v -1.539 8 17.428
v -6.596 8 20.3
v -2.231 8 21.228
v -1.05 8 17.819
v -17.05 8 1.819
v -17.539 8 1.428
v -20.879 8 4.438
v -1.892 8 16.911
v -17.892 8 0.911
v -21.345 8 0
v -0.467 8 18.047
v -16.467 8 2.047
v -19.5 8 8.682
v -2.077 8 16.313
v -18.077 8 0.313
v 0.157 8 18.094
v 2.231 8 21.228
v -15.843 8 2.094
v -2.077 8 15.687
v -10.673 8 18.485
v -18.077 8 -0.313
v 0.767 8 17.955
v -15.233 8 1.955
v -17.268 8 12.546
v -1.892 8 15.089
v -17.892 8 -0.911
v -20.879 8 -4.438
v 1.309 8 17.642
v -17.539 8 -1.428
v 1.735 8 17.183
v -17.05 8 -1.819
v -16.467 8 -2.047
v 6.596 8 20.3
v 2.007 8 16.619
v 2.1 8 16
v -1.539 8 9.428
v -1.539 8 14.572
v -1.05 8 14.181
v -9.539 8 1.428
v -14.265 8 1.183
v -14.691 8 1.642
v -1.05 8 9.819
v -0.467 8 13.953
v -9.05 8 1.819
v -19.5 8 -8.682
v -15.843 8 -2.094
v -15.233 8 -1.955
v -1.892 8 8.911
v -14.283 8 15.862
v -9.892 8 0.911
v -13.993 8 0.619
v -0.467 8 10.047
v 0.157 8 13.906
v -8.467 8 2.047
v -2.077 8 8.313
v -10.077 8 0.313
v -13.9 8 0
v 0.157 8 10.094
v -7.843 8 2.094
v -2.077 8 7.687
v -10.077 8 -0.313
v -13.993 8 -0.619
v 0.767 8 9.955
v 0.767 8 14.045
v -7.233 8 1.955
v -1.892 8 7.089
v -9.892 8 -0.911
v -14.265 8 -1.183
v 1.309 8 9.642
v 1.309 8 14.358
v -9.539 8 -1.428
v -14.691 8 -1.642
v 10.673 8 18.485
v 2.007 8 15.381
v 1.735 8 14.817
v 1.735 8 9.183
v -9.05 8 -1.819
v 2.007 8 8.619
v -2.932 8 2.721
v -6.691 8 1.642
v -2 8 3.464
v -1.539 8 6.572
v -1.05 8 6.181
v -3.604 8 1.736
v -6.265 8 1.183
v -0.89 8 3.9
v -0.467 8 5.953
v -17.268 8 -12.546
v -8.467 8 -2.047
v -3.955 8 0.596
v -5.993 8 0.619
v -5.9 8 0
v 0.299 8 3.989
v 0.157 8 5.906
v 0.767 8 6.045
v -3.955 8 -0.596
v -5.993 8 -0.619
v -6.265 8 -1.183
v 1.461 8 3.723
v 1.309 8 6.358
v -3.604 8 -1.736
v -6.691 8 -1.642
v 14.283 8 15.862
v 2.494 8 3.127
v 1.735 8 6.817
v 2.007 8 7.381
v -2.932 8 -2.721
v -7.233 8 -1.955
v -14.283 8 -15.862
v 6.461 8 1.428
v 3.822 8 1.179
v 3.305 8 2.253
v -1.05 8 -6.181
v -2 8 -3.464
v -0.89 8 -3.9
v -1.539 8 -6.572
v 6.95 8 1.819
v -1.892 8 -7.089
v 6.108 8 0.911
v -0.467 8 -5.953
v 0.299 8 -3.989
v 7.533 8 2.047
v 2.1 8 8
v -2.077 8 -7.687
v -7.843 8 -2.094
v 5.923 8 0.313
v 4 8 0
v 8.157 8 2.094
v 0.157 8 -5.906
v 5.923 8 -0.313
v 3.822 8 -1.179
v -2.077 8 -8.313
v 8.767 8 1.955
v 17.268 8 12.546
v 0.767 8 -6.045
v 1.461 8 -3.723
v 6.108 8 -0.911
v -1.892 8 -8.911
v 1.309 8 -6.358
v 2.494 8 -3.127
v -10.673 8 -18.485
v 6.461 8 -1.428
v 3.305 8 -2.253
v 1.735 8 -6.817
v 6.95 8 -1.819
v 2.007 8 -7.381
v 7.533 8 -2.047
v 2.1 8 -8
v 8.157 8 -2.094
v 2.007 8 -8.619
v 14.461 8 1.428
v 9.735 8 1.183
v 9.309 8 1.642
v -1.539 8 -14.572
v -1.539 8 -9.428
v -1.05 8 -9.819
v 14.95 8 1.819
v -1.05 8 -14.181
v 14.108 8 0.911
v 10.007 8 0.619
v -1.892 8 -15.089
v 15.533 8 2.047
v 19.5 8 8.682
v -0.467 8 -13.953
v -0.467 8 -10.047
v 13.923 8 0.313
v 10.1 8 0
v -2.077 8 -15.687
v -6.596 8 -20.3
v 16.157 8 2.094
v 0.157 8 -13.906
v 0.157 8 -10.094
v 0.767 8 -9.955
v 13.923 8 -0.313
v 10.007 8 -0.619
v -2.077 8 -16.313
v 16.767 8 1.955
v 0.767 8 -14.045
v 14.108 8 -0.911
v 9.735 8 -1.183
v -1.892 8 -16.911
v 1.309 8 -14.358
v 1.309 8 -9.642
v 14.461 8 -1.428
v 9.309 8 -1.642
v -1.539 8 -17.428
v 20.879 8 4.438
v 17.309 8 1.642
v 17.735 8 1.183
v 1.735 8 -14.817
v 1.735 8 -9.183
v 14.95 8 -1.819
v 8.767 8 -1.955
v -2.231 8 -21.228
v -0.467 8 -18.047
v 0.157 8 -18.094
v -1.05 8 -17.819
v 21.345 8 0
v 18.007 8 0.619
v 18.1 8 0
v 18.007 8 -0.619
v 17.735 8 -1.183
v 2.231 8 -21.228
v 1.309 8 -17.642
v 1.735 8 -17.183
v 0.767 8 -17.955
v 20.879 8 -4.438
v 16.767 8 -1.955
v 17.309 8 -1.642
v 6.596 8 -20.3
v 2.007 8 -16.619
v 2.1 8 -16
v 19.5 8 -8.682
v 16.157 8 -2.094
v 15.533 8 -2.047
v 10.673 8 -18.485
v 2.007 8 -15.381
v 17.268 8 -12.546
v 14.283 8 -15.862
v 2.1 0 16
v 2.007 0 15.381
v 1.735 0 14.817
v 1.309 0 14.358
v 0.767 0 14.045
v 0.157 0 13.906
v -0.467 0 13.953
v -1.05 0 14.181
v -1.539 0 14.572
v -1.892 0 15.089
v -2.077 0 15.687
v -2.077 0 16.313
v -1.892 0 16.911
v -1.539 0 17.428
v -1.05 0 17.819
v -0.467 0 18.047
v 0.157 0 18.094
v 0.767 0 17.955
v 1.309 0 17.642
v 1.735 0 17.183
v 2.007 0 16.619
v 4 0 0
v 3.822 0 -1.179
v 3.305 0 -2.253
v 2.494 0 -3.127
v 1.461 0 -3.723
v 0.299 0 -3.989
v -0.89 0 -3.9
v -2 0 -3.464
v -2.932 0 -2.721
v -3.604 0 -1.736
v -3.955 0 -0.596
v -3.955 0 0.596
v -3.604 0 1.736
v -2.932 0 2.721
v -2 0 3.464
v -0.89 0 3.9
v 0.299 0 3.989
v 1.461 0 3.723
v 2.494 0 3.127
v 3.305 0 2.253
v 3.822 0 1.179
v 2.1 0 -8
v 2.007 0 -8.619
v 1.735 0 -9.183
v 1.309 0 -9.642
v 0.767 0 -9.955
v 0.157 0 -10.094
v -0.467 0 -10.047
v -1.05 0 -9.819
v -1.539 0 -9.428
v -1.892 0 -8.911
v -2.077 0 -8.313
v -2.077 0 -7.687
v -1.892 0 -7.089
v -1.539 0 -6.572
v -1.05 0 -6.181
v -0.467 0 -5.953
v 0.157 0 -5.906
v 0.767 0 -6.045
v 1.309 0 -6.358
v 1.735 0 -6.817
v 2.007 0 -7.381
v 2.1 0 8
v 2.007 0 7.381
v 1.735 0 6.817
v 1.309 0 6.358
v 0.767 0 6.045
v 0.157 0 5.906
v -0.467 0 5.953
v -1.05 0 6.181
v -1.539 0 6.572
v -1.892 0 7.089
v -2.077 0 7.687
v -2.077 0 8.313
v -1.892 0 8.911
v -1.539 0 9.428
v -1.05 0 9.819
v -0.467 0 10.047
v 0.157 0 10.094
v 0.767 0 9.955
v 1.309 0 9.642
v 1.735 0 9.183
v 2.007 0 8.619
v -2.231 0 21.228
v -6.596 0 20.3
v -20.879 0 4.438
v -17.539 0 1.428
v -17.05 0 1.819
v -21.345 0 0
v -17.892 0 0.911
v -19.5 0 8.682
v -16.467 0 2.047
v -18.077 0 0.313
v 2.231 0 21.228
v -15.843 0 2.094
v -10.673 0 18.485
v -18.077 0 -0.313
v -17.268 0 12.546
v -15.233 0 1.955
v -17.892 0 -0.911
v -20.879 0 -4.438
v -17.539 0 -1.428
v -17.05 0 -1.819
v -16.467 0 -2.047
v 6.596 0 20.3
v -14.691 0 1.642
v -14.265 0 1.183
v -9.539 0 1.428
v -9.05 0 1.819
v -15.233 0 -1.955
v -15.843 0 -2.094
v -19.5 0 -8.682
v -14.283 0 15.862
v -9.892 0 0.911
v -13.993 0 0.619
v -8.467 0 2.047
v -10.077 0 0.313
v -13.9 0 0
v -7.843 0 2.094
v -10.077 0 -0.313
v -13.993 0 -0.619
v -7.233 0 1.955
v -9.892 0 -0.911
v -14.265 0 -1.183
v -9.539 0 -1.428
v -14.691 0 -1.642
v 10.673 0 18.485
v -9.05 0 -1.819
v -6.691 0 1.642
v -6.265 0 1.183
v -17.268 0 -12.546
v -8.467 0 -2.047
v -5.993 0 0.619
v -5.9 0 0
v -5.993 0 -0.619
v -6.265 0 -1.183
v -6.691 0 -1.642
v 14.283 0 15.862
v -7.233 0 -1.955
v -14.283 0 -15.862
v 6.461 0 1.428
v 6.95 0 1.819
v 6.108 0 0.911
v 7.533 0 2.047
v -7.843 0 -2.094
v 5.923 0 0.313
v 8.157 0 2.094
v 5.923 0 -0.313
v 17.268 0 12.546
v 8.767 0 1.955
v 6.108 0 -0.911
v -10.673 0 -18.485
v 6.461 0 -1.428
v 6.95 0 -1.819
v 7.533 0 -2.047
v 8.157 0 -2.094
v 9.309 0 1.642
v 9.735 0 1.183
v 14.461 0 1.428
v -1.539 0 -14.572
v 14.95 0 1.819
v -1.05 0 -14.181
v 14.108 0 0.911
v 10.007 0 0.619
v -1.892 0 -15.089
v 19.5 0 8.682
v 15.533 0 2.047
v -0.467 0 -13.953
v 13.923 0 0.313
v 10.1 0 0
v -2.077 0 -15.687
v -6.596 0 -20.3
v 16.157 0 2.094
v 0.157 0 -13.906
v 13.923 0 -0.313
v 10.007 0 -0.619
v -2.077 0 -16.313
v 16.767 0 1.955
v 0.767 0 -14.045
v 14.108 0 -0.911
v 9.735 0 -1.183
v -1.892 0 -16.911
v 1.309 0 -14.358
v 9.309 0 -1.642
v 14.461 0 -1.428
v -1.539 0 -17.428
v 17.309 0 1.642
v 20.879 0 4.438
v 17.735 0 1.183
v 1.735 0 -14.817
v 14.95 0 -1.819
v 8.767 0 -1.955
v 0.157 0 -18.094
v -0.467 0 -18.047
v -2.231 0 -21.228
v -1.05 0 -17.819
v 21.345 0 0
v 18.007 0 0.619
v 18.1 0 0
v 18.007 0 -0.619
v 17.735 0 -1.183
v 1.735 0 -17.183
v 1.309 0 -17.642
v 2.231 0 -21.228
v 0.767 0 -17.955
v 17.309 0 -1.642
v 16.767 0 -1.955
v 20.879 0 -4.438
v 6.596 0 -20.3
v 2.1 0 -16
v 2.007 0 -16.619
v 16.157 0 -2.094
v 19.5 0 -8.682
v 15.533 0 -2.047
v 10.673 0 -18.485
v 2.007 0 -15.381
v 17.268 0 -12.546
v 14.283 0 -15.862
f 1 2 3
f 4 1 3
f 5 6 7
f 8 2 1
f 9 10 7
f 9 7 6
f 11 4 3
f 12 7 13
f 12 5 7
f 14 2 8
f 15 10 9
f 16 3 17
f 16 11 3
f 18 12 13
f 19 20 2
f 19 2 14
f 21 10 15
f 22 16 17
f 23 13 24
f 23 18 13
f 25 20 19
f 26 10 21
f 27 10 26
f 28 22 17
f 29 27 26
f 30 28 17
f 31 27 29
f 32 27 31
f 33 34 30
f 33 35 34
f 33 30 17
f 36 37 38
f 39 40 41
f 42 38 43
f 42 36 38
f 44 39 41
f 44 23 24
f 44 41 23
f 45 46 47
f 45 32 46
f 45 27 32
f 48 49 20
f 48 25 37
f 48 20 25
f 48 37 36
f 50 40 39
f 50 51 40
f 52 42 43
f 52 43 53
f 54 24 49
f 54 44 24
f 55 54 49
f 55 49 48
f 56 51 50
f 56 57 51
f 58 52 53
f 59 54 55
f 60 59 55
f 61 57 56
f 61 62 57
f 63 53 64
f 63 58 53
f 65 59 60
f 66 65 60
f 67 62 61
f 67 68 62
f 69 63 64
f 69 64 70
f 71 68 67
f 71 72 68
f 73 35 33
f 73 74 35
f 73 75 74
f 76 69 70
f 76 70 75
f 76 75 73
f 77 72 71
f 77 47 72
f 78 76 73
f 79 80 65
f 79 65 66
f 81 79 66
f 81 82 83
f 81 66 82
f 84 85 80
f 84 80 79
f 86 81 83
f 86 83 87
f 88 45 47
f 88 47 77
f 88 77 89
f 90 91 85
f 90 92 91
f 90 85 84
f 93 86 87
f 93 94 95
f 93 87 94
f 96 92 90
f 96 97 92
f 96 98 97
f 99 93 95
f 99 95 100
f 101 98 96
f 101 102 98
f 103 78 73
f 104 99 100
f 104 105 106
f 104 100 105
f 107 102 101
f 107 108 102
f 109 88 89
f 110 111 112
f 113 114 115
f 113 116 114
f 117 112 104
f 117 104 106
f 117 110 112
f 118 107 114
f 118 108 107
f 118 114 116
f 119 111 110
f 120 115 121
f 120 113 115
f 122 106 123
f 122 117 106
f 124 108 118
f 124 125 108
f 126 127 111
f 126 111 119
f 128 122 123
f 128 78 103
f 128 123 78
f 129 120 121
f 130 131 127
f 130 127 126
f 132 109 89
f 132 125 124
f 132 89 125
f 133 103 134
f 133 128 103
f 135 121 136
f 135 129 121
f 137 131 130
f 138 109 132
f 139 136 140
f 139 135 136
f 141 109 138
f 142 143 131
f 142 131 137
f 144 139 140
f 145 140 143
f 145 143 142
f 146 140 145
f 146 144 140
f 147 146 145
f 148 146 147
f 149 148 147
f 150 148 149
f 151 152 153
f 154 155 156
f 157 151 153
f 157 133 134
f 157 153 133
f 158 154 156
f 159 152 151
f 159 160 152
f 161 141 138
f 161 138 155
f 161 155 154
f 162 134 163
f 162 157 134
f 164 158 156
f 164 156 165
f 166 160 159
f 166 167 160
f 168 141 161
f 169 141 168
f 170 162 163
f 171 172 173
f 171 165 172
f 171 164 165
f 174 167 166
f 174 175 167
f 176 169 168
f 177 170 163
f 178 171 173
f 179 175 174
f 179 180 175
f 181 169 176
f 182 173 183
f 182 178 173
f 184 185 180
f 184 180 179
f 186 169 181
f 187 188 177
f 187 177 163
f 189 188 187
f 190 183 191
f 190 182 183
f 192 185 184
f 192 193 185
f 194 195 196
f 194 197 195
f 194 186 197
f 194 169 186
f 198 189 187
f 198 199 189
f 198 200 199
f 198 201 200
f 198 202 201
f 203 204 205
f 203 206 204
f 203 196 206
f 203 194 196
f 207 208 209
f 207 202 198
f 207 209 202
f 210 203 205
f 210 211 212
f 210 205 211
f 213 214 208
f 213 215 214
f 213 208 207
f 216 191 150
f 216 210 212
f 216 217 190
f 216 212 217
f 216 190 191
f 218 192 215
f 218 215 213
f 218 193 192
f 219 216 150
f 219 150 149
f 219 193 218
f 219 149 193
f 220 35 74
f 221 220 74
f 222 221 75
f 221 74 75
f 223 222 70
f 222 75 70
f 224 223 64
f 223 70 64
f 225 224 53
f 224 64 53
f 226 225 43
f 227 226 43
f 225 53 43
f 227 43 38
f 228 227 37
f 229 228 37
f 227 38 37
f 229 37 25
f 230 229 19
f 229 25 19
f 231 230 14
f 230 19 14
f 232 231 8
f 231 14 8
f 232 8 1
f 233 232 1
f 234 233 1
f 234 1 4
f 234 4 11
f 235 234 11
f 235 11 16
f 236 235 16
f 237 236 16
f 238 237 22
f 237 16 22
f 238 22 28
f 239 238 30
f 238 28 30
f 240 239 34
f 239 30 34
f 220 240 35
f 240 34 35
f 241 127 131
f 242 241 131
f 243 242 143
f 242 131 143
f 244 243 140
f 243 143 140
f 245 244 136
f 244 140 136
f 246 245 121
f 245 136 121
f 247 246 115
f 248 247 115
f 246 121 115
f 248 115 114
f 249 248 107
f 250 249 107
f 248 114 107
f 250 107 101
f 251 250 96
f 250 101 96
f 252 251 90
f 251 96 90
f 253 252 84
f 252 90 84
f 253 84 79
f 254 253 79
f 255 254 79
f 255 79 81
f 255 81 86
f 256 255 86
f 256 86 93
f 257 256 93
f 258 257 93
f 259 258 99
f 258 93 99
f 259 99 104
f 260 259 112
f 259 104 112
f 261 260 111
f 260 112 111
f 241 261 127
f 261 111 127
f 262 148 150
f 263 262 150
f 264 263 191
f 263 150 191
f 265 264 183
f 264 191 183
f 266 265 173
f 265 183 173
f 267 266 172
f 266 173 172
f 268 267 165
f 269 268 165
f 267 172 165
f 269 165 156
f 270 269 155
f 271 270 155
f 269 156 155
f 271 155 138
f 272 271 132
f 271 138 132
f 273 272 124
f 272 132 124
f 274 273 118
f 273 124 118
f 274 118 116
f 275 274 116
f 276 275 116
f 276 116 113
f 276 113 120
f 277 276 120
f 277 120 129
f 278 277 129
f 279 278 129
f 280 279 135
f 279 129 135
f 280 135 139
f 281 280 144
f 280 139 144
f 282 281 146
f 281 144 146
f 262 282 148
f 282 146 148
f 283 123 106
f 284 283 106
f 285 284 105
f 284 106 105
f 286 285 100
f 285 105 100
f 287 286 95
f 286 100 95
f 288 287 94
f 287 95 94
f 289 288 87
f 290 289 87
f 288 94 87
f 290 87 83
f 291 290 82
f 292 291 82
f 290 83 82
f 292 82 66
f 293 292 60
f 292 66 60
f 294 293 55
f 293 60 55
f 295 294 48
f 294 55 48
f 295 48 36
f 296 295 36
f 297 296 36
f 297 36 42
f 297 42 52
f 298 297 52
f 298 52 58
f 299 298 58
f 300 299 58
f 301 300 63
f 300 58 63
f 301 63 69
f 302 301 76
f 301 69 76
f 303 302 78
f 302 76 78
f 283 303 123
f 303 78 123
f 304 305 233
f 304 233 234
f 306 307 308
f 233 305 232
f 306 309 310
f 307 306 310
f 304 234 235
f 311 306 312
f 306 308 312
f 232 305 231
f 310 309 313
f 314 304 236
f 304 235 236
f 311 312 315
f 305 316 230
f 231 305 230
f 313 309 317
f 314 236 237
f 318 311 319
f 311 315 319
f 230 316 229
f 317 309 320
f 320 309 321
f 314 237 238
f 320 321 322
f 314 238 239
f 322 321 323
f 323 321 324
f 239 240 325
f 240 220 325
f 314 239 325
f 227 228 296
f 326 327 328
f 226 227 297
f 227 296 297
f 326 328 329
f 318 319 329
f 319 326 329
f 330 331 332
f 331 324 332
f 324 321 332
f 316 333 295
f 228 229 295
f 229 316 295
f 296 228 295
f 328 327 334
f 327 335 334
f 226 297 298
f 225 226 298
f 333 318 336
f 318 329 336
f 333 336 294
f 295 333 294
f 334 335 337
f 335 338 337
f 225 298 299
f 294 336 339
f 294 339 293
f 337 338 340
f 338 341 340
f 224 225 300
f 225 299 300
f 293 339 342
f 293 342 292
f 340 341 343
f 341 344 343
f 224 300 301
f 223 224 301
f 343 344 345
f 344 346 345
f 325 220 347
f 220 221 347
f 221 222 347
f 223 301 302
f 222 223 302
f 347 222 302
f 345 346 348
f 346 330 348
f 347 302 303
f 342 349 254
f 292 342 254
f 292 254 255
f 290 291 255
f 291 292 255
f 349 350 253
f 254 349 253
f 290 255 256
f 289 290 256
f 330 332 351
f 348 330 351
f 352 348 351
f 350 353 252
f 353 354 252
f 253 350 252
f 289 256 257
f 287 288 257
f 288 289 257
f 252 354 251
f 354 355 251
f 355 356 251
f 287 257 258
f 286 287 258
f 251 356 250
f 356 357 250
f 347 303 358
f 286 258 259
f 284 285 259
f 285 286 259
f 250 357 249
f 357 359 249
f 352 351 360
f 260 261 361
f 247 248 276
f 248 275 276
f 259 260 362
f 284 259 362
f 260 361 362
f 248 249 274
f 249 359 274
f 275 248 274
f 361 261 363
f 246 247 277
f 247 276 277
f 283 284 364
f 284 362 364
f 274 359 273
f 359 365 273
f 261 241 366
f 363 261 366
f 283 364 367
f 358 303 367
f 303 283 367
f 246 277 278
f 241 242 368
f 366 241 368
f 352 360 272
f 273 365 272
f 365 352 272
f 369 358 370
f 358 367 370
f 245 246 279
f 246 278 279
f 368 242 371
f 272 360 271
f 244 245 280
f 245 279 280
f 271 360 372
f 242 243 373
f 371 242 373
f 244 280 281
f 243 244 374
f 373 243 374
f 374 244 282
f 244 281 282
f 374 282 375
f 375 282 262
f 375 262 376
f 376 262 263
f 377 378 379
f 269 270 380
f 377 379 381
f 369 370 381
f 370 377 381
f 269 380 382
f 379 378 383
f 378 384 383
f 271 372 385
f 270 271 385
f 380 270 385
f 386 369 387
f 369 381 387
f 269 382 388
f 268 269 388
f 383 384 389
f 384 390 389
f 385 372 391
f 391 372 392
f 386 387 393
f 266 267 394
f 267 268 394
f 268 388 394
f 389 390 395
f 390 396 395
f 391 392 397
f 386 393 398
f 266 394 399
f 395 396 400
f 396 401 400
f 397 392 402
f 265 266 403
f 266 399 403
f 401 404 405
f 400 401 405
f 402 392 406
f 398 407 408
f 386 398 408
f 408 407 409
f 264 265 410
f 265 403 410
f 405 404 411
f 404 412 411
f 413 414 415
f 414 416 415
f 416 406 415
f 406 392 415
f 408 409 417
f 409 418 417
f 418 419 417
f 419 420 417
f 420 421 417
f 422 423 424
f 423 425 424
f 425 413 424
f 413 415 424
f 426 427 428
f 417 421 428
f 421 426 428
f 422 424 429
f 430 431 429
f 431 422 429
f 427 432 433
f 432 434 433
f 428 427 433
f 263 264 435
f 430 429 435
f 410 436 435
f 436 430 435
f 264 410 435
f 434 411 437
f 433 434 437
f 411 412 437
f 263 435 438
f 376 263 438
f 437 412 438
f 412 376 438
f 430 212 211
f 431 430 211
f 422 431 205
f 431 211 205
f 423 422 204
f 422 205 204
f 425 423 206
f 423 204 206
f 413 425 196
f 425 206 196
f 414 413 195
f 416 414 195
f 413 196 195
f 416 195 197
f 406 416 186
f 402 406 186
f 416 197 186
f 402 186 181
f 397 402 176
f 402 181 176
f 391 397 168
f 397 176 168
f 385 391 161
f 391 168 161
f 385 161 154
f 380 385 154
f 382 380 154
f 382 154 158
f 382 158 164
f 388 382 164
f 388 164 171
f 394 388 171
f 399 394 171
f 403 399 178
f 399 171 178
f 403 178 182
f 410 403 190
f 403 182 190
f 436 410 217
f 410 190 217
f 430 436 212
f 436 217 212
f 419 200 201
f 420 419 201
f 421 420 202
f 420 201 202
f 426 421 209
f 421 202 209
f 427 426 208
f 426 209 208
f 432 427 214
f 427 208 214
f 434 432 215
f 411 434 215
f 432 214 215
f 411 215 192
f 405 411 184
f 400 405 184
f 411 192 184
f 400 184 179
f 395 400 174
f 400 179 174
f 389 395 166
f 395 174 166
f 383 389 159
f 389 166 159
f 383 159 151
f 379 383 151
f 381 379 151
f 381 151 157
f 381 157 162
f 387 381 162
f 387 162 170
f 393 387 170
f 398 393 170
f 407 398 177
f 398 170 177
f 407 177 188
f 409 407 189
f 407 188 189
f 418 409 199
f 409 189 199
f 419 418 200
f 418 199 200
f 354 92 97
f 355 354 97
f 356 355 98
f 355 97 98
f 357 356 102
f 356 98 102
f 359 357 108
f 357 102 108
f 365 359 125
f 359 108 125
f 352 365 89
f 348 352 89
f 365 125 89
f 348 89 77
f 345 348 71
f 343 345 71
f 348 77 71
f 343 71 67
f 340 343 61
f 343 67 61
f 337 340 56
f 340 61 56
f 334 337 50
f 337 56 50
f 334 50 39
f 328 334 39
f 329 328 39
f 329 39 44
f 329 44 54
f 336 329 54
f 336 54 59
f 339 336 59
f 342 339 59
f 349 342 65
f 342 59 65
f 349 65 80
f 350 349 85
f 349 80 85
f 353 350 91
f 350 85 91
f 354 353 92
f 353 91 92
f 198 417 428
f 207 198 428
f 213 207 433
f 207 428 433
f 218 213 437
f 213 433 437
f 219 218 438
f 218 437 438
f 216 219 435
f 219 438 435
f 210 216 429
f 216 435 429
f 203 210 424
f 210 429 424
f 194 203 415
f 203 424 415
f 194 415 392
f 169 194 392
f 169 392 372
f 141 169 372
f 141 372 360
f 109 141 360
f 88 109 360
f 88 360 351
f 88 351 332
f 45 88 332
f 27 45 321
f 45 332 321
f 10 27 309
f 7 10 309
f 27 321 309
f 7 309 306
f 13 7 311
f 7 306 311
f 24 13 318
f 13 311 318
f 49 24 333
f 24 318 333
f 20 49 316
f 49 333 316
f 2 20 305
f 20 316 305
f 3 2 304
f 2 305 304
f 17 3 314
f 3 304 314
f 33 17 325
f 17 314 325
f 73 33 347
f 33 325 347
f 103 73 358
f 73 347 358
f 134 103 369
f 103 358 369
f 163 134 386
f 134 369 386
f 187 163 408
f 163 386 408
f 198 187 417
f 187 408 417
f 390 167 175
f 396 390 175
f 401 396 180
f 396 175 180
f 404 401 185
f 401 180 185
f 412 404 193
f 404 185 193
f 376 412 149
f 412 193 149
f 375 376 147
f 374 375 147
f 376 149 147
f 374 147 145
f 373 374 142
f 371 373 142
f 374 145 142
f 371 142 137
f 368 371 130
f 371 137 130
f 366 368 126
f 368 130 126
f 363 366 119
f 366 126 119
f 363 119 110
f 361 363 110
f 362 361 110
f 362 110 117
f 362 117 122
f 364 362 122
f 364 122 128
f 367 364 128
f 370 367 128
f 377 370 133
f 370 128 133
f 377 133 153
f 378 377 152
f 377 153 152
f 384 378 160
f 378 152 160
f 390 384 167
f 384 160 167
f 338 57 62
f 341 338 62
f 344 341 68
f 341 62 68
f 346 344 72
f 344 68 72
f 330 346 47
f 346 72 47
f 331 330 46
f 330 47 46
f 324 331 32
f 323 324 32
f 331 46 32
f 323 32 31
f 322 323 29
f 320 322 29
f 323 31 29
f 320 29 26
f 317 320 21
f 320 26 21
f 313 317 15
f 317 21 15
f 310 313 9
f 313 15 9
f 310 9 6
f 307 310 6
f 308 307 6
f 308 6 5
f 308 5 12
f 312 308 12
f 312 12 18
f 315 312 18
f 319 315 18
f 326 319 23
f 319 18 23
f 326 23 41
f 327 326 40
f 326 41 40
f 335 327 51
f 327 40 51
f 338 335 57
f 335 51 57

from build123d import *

# Parameters (mm, degrees)
SKETCH_1_R          = 21.345
EXTRUDE_1_DEPTH     = 8
SKETCH_2_R          = 4
CUT_EXTRUDE_1_DEPTH = 8
SKETCH_3_R          = 2.1
CUT_EXTRUDE_2_DEPTH = 8


with BuildPart() as part:
    # 스케치1 → 보스-돌출1 (new body)
    with BuildSketch(Plane(origin=(0, 0, 0), x_dir=(1, 0, 0), z_dir=(0, 1, 0))):
        Circle(SKETCH_1_R)
    extrude(amount=EXTRUDE_1_DEPTH)

    # 스케치2 → 컷-돌출1 (cut)
    with BuildSketch(Plane(origin=(0, 8, 0), x_dir=(1, 0, 0), z_dir=(0, 1, 0))):
        Circle(SKETCH_2_R)
    extrude(amount=-CUT_EXTRUDE_1_DEPTH, mode=Mode.SUBTRACT)

    # 스케치3 → 컷-돌출2 (cut)
    with BuildSketch(Plane(origin=(0, 8, 0), x_dir=(1, 0, 0), z_dir=(0, 1, 0))):
        with Locations((0, 8)):
            Circle(SKETCH_3_R)
        with Locations((0, 16)):
            Circle(SKETCH_3_R)
        with Locations((16, 0)):
            Circle(SKETCH_3_R)
        with Locations((8, 0)):
            Circle(SKETCH_3_R)
        with Locations((-8, 0)):
            Circle(SKETCH_3_R)
        with Locations((-16, 0)):
            Circle(SKETCH_3_R)
        with Locations((0, -8)):
            Circle(SKETCH_3_R)
        with Locations((0, -16)):
            Circle(SKETCH_3_R)
    extrude(amount=-CUT_EXTRUDE_2_DEPTH, mode=Mode.SUBTRACT)


solid = part.part
